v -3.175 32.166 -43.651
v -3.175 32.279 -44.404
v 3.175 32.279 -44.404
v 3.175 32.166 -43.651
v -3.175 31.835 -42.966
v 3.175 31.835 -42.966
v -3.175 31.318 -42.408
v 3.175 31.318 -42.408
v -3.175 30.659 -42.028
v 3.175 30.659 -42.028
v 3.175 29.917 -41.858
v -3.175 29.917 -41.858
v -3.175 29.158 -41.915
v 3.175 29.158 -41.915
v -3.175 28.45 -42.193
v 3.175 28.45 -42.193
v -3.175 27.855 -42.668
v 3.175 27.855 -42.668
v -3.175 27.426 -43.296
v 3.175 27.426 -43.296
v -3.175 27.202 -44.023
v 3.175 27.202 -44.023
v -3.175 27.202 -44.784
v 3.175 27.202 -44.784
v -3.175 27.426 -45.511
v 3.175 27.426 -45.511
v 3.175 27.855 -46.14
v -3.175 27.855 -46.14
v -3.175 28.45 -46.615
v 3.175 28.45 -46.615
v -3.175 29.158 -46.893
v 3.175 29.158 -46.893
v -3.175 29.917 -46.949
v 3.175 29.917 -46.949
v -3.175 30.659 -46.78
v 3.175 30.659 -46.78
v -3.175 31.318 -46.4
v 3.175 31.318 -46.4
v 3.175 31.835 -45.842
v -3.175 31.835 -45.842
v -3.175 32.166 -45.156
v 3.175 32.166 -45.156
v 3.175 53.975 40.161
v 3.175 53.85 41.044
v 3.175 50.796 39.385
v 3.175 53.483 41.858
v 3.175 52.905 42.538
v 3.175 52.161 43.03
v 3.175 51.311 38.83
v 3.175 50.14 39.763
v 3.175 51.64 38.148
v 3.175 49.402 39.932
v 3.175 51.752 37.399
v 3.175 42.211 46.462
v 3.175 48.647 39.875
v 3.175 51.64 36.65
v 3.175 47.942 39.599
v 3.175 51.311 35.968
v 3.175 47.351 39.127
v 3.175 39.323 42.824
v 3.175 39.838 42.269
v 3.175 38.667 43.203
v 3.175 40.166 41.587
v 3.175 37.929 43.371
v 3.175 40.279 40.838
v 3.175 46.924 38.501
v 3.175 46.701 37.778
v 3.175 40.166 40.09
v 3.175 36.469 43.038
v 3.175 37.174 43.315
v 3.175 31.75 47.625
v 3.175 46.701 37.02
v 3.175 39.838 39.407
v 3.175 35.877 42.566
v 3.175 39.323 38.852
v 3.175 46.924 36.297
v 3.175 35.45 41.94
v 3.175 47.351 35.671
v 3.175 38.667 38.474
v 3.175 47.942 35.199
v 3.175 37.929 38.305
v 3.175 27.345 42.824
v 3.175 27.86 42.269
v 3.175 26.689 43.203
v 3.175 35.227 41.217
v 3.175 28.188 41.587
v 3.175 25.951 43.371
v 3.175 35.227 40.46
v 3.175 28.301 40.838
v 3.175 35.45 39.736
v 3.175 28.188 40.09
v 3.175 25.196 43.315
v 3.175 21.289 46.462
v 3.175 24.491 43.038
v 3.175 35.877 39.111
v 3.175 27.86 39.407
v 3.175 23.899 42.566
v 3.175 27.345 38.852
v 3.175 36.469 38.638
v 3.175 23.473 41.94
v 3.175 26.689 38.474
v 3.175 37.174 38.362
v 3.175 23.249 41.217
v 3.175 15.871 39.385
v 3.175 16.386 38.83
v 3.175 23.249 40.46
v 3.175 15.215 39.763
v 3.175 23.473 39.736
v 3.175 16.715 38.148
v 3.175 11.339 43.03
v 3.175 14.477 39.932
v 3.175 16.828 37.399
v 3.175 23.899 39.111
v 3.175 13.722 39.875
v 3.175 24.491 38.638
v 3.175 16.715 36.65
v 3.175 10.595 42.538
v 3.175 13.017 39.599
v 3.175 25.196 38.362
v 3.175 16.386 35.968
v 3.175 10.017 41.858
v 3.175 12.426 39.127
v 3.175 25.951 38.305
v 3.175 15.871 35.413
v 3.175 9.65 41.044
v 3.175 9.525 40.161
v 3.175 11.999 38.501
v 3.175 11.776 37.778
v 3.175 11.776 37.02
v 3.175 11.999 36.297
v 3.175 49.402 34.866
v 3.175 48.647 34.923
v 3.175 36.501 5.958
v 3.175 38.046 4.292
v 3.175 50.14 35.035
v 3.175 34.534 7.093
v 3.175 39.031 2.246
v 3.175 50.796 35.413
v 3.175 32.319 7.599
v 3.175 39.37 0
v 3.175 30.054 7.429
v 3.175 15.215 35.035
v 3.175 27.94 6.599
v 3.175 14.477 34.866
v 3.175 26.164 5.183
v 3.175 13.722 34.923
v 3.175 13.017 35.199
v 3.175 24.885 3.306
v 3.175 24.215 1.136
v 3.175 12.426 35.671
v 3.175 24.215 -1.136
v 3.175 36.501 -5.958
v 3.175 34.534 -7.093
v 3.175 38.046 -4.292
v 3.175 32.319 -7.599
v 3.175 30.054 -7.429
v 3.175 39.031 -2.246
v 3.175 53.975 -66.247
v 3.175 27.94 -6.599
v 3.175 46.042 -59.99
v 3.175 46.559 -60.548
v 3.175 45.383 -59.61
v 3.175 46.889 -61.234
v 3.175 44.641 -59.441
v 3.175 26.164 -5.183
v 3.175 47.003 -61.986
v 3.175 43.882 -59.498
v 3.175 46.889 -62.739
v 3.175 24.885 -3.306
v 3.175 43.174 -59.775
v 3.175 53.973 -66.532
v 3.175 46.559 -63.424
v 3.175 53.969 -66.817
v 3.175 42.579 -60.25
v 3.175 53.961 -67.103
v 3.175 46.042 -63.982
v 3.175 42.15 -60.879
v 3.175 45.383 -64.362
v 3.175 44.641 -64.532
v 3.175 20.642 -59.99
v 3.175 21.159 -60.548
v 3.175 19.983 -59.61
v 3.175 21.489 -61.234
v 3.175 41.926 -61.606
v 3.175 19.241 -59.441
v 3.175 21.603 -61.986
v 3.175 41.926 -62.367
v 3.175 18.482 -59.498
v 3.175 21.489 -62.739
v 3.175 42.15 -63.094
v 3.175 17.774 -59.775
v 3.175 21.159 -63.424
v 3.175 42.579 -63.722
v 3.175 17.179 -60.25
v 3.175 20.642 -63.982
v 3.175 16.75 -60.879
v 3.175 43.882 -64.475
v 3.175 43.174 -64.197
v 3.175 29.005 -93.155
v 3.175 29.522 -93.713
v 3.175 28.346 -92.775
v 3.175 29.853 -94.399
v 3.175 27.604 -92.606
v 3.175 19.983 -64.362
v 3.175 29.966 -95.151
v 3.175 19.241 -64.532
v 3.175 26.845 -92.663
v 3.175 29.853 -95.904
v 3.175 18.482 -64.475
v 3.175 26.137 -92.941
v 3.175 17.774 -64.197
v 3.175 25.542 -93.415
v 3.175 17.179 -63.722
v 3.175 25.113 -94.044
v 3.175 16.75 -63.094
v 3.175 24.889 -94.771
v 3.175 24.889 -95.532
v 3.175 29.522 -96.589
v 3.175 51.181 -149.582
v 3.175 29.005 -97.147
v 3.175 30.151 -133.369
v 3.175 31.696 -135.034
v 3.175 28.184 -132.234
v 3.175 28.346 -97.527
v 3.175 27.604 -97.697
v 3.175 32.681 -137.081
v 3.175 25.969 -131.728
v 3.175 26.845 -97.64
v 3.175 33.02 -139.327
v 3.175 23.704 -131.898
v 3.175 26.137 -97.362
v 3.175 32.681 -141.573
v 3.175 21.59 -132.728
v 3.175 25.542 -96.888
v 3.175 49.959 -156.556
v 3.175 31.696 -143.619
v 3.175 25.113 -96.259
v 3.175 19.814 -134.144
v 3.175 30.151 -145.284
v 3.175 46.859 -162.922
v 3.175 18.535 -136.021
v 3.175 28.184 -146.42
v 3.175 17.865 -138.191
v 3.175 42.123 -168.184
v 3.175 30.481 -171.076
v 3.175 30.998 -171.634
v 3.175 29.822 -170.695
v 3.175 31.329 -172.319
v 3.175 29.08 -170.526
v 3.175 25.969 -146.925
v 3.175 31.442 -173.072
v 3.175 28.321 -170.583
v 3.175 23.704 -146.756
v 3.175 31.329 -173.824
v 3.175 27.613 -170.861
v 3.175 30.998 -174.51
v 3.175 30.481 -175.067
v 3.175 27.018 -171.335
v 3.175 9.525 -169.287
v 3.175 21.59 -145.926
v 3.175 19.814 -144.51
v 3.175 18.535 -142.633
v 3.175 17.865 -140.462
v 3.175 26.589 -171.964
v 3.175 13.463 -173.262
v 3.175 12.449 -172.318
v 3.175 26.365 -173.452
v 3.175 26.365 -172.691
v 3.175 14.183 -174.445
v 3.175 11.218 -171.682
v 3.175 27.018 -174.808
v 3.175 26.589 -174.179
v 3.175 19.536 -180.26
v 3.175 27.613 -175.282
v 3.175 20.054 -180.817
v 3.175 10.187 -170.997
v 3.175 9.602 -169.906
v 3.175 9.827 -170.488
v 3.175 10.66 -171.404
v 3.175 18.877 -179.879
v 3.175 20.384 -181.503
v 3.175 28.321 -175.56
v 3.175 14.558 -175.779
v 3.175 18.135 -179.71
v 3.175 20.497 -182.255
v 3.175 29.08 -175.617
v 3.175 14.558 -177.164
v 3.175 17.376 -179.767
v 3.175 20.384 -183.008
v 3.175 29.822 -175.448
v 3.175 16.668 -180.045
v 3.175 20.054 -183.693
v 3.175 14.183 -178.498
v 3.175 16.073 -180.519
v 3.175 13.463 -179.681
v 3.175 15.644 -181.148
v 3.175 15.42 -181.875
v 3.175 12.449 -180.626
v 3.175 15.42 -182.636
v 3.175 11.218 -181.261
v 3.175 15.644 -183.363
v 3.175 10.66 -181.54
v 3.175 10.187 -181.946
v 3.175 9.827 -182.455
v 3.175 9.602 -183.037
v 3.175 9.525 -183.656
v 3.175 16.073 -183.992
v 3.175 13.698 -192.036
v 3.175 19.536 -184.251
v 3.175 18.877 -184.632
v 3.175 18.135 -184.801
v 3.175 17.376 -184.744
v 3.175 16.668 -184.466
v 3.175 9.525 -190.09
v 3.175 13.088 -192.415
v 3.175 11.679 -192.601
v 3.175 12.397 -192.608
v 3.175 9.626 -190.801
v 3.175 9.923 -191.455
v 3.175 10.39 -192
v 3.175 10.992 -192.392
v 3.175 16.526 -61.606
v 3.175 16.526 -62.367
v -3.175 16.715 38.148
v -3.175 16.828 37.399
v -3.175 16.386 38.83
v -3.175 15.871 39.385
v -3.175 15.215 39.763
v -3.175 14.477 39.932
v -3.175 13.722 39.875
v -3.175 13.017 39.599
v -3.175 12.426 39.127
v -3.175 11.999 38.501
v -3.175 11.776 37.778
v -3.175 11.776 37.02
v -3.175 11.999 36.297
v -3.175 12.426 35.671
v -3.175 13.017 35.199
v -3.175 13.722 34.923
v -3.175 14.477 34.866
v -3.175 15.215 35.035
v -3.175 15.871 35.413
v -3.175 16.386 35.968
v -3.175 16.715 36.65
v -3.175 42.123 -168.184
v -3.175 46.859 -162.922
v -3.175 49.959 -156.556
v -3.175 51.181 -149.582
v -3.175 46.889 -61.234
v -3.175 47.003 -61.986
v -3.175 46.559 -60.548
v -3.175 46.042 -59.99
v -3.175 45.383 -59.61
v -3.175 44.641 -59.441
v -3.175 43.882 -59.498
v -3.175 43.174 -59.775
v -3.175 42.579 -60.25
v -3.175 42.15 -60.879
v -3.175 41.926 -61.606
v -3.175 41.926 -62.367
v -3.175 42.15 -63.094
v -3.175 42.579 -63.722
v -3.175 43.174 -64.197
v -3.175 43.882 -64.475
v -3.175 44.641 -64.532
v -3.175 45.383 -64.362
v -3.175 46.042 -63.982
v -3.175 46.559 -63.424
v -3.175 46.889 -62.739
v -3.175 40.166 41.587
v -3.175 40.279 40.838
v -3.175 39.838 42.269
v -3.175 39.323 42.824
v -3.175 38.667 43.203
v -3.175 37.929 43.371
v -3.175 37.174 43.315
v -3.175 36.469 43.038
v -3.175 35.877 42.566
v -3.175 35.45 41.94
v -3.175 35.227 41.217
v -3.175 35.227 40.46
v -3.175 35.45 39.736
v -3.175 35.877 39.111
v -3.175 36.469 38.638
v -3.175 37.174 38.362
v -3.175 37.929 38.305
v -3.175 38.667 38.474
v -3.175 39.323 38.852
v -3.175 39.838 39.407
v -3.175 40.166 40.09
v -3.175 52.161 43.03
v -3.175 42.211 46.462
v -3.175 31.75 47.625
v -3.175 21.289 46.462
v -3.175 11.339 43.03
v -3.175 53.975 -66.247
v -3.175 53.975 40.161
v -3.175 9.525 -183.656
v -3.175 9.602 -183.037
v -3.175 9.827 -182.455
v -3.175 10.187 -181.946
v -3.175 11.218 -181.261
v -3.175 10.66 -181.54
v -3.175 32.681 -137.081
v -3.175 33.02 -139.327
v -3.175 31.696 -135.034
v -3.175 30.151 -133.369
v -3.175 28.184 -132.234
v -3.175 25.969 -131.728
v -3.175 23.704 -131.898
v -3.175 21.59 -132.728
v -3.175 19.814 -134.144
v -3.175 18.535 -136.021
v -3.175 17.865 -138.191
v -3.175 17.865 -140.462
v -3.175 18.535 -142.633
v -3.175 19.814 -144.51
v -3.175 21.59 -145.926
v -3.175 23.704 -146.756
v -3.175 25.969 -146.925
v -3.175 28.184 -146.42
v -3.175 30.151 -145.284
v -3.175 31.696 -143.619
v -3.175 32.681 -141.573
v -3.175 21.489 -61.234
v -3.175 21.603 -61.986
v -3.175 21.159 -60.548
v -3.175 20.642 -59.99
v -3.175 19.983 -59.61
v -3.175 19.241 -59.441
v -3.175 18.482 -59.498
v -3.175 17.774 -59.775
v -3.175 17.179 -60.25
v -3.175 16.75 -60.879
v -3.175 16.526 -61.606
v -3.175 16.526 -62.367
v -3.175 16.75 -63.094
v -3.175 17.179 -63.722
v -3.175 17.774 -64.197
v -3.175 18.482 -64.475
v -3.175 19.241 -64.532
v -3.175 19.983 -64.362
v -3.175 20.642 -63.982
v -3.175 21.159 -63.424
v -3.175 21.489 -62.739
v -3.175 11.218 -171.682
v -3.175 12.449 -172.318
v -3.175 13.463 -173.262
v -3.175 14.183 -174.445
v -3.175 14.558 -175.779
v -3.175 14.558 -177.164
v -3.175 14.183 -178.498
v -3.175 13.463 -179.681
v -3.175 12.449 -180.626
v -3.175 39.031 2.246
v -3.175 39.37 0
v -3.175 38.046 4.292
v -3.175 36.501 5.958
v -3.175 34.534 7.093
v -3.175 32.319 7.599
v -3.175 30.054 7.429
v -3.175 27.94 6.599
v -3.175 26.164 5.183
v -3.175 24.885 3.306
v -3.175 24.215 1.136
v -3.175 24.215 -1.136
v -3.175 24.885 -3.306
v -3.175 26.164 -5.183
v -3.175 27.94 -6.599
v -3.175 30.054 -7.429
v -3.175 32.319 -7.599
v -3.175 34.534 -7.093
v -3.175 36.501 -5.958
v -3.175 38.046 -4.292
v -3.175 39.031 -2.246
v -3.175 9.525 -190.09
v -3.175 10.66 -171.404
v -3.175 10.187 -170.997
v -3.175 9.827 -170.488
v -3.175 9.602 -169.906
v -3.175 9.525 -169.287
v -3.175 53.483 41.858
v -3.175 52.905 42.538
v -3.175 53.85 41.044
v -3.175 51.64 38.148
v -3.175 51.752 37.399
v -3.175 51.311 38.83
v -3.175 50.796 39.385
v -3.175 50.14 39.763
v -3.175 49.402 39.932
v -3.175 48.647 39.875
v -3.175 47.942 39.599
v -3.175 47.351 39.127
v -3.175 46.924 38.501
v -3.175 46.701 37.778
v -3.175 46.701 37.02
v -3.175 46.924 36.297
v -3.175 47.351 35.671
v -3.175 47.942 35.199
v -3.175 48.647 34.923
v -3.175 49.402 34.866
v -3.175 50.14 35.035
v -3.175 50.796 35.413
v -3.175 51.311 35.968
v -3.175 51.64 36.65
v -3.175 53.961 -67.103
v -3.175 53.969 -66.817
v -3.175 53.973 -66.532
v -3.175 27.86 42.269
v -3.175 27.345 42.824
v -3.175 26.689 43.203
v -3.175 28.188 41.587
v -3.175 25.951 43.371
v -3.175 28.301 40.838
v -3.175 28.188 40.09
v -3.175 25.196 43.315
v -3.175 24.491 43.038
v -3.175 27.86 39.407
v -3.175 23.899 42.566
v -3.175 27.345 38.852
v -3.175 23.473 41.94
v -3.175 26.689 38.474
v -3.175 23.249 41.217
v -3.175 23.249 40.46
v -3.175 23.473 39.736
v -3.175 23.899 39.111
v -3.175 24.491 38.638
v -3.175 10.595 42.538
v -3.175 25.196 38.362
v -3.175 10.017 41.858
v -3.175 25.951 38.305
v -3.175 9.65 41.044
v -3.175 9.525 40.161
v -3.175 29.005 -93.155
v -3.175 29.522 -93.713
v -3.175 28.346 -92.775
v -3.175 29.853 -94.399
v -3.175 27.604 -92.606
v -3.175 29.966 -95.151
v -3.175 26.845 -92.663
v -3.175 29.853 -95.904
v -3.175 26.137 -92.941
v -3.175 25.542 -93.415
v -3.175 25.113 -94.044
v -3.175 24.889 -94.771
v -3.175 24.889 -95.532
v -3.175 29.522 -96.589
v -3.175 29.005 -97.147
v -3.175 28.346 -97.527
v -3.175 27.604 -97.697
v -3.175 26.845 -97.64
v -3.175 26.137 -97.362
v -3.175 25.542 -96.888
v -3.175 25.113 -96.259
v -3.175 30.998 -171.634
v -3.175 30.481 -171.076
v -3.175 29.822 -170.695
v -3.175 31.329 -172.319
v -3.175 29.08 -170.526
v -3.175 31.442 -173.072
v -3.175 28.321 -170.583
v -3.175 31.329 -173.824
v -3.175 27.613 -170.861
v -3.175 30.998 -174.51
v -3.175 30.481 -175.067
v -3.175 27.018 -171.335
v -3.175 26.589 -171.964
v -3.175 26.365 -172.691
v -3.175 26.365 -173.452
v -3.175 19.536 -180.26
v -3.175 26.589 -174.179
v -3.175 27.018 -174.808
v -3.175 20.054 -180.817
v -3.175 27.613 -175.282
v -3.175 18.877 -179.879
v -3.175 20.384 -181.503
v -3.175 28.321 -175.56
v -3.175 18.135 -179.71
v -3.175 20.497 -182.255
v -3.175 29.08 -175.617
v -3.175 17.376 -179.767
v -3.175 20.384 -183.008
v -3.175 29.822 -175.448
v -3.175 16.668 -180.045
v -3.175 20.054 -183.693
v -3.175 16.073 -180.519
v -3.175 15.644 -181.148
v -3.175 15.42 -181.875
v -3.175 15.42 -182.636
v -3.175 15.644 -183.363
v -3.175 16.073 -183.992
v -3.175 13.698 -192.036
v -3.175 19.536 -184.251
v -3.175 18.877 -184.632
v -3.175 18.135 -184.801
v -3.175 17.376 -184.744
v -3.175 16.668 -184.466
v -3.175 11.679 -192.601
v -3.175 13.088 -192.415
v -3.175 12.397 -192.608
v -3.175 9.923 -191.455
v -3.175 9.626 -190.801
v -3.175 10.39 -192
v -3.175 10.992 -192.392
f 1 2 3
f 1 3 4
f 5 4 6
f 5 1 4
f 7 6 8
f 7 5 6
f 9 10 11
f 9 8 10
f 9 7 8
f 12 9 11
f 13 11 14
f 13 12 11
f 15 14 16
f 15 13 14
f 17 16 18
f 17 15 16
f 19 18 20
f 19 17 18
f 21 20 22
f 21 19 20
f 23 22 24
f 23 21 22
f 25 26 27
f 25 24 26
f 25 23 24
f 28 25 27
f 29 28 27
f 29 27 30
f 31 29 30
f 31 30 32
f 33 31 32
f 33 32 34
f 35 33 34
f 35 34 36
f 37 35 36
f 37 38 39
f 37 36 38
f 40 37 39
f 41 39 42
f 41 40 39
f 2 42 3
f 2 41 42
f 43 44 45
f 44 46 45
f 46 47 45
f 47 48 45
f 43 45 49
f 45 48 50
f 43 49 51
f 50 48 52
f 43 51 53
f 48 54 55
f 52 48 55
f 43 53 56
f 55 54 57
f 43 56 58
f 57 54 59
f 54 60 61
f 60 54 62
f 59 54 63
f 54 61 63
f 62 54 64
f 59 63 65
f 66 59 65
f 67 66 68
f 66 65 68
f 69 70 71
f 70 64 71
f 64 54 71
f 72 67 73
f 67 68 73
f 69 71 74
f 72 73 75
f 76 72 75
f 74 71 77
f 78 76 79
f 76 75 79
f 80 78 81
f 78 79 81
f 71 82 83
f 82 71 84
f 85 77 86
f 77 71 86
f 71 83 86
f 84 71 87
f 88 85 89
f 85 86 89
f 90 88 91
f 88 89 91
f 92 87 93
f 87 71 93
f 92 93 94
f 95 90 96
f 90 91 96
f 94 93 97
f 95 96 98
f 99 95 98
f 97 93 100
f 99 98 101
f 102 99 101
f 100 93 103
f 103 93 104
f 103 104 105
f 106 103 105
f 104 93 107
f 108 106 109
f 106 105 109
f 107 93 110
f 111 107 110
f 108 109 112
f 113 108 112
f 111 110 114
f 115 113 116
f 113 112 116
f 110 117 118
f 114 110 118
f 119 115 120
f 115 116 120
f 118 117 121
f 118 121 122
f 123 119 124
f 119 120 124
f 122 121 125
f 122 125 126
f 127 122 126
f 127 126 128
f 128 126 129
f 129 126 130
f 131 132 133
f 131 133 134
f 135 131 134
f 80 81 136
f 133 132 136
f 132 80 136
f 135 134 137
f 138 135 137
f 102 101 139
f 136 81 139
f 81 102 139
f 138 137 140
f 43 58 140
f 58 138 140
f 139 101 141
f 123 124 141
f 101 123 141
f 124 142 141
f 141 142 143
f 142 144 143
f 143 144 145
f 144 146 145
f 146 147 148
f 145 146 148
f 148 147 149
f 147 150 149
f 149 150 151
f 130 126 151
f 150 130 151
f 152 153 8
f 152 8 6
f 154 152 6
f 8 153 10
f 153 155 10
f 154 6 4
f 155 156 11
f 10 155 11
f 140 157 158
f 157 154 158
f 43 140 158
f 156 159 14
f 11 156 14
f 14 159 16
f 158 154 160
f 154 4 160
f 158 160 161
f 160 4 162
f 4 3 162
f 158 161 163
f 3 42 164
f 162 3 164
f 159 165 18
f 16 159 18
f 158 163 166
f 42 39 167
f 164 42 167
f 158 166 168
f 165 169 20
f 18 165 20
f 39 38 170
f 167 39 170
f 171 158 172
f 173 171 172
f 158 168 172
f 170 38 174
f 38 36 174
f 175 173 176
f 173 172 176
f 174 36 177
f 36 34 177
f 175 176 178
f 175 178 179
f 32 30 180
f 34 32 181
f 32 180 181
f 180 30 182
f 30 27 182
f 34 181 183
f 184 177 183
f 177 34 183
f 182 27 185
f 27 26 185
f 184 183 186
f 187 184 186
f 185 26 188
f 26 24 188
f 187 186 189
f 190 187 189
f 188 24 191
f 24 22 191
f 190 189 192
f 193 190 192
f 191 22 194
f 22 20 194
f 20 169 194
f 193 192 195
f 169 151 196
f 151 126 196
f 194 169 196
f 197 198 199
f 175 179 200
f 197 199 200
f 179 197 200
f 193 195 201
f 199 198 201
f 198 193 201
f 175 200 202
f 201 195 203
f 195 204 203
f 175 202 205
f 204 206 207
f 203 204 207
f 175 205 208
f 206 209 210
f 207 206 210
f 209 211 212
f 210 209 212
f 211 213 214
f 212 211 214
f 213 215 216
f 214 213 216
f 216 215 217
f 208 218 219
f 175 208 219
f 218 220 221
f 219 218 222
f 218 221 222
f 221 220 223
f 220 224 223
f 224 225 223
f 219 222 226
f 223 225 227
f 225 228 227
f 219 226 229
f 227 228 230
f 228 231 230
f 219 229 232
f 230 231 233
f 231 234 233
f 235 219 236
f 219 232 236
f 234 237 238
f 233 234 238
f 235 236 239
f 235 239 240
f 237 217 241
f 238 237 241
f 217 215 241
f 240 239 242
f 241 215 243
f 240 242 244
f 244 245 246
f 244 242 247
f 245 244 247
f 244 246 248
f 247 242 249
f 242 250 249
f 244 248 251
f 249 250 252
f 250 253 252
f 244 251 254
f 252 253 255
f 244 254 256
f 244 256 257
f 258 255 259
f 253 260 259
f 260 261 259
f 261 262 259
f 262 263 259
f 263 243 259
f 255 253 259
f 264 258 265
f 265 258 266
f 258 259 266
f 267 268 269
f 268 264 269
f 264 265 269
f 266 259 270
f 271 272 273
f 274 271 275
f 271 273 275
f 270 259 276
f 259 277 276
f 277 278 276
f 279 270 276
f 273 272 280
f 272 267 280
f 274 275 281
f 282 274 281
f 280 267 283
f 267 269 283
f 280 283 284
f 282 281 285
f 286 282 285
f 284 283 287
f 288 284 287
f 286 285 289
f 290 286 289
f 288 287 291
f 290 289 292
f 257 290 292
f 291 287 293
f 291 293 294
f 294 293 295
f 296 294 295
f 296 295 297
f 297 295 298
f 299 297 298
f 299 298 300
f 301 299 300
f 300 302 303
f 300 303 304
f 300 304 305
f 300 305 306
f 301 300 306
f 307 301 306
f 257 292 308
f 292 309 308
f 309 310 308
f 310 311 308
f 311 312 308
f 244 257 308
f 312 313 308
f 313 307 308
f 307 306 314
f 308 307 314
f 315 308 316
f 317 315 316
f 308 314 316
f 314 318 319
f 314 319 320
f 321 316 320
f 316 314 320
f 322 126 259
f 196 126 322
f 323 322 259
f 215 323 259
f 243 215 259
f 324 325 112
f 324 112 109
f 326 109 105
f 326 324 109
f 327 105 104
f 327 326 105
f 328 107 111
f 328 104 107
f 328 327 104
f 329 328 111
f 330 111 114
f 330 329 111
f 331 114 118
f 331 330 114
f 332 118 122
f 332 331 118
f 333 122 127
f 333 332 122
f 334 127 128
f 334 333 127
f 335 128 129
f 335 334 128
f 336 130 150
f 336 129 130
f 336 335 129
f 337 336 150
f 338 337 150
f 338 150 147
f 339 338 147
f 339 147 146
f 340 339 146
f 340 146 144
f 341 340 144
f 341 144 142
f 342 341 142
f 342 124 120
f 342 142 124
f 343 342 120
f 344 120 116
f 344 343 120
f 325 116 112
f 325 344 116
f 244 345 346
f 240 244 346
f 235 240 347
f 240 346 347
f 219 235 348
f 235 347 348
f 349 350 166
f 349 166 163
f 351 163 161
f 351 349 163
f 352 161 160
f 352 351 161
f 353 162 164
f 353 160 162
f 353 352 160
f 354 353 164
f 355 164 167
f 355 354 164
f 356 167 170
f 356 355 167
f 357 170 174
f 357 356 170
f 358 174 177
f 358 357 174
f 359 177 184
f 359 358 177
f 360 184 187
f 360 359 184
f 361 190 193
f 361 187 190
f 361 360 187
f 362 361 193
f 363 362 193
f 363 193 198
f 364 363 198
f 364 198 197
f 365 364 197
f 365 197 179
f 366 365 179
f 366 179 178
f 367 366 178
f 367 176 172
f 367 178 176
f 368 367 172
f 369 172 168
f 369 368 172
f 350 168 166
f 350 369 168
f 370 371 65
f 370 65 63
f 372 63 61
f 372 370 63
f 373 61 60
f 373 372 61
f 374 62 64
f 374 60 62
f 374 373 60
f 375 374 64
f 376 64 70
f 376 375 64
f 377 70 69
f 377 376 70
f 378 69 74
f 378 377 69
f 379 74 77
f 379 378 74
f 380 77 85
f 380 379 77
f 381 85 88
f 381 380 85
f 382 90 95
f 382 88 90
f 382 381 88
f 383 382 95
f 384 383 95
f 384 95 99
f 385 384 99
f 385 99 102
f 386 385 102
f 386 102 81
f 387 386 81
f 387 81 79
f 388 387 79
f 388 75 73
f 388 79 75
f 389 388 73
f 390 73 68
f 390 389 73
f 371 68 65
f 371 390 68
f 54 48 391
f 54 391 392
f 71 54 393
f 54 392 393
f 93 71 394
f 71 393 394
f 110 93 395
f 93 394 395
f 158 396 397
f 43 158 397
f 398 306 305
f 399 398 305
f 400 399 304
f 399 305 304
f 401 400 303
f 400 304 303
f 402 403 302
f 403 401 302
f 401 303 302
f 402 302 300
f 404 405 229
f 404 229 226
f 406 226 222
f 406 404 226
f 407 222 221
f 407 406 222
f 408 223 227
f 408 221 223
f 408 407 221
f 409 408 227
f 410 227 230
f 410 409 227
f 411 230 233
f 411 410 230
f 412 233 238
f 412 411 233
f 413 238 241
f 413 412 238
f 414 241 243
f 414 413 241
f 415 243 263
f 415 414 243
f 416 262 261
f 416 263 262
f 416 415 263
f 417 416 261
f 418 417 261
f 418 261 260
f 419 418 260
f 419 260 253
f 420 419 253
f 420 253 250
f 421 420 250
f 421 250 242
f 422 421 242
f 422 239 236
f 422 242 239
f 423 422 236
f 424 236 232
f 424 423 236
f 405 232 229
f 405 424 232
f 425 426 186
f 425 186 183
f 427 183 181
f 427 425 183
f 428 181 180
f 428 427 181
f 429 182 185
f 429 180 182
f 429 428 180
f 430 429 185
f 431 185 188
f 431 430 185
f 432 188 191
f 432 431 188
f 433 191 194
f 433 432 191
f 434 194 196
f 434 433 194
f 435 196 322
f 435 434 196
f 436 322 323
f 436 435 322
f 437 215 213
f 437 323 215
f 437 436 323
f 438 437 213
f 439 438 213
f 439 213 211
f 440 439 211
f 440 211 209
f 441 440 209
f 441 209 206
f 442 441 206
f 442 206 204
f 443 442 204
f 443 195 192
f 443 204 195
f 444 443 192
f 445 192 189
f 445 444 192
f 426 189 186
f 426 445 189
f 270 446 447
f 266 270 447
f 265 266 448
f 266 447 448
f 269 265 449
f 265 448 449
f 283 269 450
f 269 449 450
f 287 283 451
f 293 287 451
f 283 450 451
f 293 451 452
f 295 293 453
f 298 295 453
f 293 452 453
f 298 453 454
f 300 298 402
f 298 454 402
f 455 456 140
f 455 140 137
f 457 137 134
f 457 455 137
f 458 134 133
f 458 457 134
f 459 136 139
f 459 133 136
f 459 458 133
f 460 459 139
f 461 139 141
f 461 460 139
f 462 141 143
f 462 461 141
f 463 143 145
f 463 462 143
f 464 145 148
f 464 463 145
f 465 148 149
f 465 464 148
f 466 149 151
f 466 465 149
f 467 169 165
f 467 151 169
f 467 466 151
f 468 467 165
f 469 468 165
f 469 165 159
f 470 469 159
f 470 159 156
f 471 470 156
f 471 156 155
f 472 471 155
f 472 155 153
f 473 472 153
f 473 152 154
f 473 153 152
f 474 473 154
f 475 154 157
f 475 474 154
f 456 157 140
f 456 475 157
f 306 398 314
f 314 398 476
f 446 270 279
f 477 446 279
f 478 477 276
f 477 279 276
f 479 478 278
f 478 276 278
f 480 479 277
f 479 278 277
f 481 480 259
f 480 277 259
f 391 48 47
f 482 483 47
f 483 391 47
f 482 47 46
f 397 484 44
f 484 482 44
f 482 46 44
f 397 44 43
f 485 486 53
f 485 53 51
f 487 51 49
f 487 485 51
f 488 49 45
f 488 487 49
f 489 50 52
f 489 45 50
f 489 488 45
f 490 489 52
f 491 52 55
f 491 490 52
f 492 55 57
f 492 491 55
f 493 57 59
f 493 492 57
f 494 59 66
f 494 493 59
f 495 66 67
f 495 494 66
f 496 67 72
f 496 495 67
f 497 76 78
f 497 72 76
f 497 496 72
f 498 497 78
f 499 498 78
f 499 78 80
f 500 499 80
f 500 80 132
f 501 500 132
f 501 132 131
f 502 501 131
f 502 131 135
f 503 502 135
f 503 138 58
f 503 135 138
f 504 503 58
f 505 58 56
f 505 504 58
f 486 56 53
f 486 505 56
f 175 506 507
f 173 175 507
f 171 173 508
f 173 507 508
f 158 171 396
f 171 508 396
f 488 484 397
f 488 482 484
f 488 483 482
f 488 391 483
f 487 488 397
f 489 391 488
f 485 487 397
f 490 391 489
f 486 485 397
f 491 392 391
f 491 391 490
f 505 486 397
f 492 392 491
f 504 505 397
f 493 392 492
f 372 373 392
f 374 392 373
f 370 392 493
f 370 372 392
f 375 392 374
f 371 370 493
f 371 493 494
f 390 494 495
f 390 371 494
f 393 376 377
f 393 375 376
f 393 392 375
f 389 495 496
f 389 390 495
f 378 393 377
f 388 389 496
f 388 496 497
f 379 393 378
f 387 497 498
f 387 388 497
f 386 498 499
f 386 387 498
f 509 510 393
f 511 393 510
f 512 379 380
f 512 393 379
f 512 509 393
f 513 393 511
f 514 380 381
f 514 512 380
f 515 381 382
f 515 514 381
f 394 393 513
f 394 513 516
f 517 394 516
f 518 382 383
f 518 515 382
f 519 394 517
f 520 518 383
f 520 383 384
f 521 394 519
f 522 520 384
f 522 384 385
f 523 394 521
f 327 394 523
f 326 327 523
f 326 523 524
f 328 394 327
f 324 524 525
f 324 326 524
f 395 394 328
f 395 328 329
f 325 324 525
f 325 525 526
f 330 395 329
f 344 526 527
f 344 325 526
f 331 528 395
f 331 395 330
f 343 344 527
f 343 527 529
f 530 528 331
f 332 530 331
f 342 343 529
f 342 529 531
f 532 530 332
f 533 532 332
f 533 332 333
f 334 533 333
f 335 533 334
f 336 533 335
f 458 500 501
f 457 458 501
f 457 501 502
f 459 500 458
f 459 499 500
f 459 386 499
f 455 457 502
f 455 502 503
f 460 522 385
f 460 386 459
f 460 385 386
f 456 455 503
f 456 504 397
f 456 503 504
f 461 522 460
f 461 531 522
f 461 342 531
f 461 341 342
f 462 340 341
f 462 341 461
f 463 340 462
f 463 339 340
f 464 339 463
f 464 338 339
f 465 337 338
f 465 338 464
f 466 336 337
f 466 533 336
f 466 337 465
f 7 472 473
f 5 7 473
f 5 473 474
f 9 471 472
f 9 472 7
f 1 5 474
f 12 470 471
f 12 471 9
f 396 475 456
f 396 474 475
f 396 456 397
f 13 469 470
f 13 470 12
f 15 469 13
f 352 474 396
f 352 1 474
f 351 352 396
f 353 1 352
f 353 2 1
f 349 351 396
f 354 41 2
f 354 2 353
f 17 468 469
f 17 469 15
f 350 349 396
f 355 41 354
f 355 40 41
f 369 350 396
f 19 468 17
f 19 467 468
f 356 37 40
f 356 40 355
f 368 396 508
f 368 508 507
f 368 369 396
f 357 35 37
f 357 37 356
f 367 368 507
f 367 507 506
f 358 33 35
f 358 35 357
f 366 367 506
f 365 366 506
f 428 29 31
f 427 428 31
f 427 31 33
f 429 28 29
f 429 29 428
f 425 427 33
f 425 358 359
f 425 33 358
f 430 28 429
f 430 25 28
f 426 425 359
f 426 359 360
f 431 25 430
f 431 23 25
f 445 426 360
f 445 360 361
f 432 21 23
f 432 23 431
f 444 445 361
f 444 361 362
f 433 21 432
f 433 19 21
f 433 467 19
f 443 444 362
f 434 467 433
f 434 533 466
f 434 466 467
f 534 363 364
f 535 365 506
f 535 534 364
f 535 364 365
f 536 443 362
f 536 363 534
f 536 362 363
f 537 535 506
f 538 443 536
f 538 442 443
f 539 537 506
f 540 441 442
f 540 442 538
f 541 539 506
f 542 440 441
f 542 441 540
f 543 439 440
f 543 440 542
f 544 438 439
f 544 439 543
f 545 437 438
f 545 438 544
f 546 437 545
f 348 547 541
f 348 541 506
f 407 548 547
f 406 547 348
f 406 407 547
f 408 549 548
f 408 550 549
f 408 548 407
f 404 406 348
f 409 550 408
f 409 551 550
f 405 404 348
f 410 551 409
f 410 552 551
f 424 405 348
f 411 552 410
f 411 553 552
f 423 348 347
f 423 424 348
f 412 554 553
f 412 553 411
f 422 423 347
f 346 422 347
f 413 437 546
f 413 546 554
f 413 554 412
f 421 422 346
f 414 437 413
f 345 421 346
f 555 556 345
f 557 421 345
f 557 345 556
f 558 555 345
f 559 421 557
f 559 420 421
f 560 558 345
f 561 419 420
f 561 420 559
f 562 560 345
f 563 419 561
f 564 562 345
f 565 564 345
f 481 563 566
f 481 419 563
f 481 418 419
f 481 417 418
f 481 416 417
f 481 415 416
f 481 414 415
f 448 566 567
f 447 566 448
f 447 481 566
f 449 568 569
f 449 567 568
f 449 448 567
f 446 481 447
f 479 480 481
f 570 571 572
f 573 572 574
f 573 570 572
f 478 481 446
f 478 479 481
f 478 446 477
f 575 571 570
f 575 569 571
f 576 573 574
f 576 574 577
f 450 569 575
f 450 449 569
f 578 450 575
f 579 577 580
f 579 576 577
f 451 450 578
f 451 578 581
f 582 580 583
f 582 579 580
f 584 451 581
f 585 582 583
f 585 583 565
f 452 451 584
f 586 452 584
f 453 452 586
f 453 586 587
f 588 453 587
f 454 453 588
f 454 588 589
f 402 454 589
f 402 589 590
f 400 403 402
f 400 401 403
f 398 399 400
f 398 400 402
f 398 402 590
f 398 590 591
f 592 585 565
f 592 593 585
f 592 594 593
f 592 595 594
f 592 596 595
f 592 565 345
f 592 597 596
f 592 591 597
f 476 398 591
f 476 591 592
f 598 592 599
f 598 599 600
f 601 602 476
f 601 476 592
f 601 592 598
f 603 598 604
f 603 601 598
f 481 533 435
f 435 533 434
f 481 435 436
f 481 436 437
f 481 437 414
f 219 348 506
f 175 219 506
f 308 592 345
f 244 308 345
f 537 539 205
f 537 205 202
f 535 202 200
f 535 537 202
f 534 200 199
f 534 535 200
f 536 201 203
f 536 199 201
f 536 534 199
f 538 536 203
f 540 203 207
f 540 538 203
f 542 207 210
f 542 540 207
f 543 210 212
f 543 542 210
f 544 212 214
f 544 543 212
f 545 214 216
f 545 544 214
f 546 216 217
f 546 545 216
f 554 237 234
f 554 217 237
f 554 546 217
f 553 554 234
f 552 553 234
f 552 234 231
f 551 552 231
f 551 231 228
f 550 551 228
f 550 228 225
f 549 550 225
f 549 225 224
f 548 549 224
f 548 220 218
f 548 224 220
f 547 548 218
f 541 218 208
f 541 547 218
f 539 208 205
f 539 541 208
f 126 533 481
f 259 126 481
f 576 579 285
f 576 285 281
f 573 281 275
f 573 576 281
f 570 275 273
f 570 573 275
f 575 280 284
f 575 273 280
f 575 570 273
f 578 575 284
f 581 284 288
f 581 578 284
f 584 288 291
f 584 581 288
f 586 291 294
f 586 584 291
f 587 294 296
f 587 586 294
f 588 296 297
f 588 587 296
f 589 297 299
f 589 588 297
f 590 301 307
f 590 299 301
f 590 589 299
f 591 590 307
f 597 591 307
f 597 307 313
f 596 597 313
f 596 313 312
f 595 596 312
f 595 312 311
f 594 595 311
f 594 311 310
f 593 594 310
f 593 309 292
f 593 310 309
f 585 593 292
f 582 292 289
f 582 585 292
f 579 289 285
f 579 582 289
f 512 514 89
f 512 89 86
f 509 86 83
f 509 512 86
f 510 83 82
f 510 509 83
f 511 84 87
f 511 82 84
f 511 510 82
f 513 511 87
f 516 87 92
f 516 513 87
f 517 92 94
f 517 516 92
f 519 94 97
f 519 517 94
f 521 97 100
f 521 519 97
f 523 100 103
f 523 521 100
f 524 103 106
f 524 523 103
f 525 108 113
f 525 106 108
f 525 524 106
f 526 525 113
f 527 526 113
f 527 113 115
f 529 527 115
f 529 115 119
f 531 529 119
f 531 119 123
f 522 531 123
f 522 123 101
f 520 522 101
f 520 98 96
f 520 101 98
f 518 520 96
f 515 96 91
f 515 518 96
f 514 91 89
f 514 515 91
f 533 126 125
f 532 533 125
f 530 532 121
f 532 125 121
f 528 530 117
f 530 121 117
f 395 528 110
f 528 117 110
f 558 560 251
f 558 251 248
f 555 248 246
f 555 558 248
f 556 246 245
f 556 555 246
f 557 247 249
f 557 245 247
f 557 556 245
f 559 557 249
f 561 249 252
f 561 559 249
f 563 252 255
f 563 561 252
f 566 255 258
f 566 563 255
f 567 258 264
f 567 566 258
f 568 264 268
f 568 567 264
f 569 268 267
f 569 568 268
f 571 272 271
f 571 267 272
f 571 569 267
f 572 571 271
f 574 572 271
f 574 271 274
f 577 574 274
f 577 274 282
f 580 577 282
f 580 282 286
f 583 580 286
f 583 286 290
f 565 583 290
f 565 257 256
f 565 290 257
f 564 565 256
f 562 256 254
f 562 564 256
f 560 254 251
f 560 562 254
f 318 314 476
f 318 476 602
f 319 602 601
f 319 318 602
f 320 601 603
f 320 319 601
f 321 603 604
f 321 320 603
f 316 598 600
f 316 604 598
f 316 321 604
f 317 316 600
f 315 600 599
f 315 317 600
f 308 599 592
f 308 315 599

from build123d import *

# Parameters (mm, degrees)
STOCK_HAMMERSAW_START                   = -149.225
STOCK_HAMMERSAW_MULTIBODY_1_OUTLINE_R   = 2.5527
STOCK_HAMMERSAW_MULTIBODY_1_OUTLINE_R_2 = 7.62
STOCK_HAMMERSAW_MULTIBODY_1_OUTLINE_R_3 = 2.54
STOCK_HAMMERSAW_MULTIBODY_1_DEPTH       = 9.525
FILLET1_R                               = 2.54
FILLET2_R                               = 3.175
FILLET3_R                               = 25.4
FILLET4_R                               = 2.54
CUT_EXTRUDE1_DEPTH                      = 201.10578904
CUT_EXTRUDE1_DEPTH_BACK                 = 201.10578904
SKETCH1_W                               = 1.5875
SKETCH1_H                               = 240.255072357


with BuildPart() as part:
    # Stock-HammerSaw Multibody-1: read off the stored shape, not the designer's step
    # Stock-HammerSaw Multibody-1 outline → Stock-HammerSaw Multibody-1 (new body)
    with BuildSketch(Plane.YZ.offset(STOCK_HAMMERSAW_START)):
        with BuildLine():
            Line((9.525, 42.121134838), (9.525, -171.391646474))
            ThreePointArc((9.525, -171.391646474), (14.605, -176.471646474), (9.525, -181.551646474))
            Line((9.525, -181.551646474), (9.525, -195.537119935))
            Line((9.525, -195.537119935), (50.8, -160.903282658))
            Line((50.8, -160.903282658), (53.975, -66.675))
            Line((53.975, -66.675), (53.975, 42.121134838))
            ThreePointArc((53.975, 42.121134838), (31.75, 47.625), (9.525, 42.121134838))
        make_face()
        with Locations((17.944382949, -182.255416592)):
            Circle(STOCK_HAMMERSAW_MULTIBODY_1_OUTLINE_R, mode=Mode.SUBTRACT)
        with Locations((28.88924293, -173.071588618)):
            Circle(STOCK_HAMMERSAW_MULTIBODY_1_OUTLINE_R, mode=Mode.SUBTRACT)
        with Locations((25.4, -139.326770285)):
            Circle(STOCK_HAMMERSAW_MULTIBODY_1_OUTLINE_R_2, mode=Mode.SUBTRACT)
        with Locations((27.413358223, -95.151227202)):
            Circle(STOCK_HAMMERSAW_MULTIBODY_1_OUTLINE_R, mode=Mode.SUBTRACT)
        with Locations((19.05, -61.986201926)):
            Circle(STOCK_HAMMERSAW_MULTIBODY_1_OUTLINE_R, mode=Mode.SUBTRACT)
        with Locations((29.726233837, -44.403906028)):
            Circle(STOCK_HAMMERSAW_MULTIBODY_1_OUTLINE_R, mode=Mode.SUBTRACT)
        with Locations((14.2875, 37.399020291)):
            Circle(STOCK_HAMMERSAW_MULTIBODY_1_OUTLINE_R_3, mode=Mode.SUBTRACT)
        with Locations((25.761047521, 40.838193804)):
            Circle(STOCK_HAMMERSAW_MULTIBODY_1_OUTLINE_R_3, mode=Mode.SUBTRACT)
        with Locations((44.45, -61.986201926)):
            Circle(STOCK_HAMMERSAW_MULTIBODY_1_OUTLINE_R, mode=Mode.SUBTRACT)
        with Locations((31.75, 0)):
            Circle(STOCK_HAMMERSAW_MULTIBODY_1_OUTLINE_R_2, mode=Mode.SUBTRACT)
        with Locations((37.738952479, 40.838193804)):
            Circle(STOCK_HAMMERSAW_MULTIBODY_1_OUTLINE_R_3, mode=Mode.SUBTRACT)
        with Locations((49.2125, 37.399020291)):
            Circle(STOCK_HAMMERSAW_MULTIBODY_1_OUTLINE_R_3, mode=Mode.SUBTRACT)
    extrude(amount=STOCK_HAMMERSAW_MULTIBODY_1_DEPTH)


with BuildPart() as part_1:
    # Body-Move/Copy2: read off the stored shape, not the designer's step
    # Body-Move/Copy2: moved
    add(part.part.moved(Location((144.4625, 0, 0))))

    # Fillet1
    fillet1_edges = [part_1.edges().sort_by_distance(p)[0] for p in [
        (0, 9.525, -195.537119935),
    ]]
    fillet(fillet1_edges, radius=FILLET1_R)

    # Fillet2
    fillet2_edges = [part_1.edges().sort_by_distance(p)[0] for p in [
        (0, 53.975, 42.121134838),
        (0, 9.525, 42.121134838),
    ]]
    fillet(fillet2_edges, radius=FILLET2_R)

    # Fillet3
    # the kernel refuses this fillet: 25.4 mm, written as the material it takes off along each edge
    with BuildSketch(Plane(origin=(-33.08112114, 50.8, -160.903282658), x_dir=(0, -0.7660444431175363, -0.6427876096882575), z_dir=(1, 0, 0))) as fillet3_piece_1:
        with BuildLine():
            CenterArc((FILLET3_R * 0.445962537632, -FILLET3_R), FILLET3_R, 90, 48.070162195)
            Line((-FILLET3_R * 0.2980011219, -FILLET3_R * 0.33177992151), (0, 0))
            Line((0, 0), (FILLET3_R * 0.445962537632, 0))
        make_face()
    extrude(amount=66.162242279, mode=Mode.SUBTRACT)
    with BuildSketch(Plane(origin=(-5.832005366, 53.975, -66.675), x_dir=(0, 0, 1), z_dir=(1, 0, 0))) as fillet3_piece_2:
        with BuildLine():
            CenterArc((FILLET3_R * 0.0168426041932, FILLET3_R), FILLET3_R, 268.070162195, 1.929837805)
            Line((-FILLET3_R * 0.0168330513083, FILLET3_R * 0.000567185736557), (0, 0))
            Line((0, 0), (FILLET3_R * 0.0168426041932, 0))
        make_face()
    extrude(amount=11.664010733, mode=Mode.SUBTRACT)

    # Fillet4
    fillet4_edges = [part_1.edges().sort_by_distance(p)[0] for p in [
        (0, 9.525, -181.551646474),
        (0, 9.525, -171.391646474),
    ]]
    fillet(fillet4_edges, radius=FILLET4_R)

    # Sketch1 → Cut-Extrude1 (cut, two sides: drawn at the far end of the back side and taken through both)
    with BuildSketch(Plane(origin=(0, 0, 0), x_dir=(1, 0, 0), z_dir=(0, 1, 0)).offset(-CUT_EXTRUDE1_DEPTH_BACK)):
        with Locations((-3.96875, 72.502536179)):
            Rectangle(SKETCH1_W, SKETCH1_H)
        with Locations((3.96875, 72.502536179)):
            Rectangle(SKETCH1_W, SKETCH1_H)
    extrude(amount=CUT_EXTRUDE1_DEPTH + CUT_EXTRUDE1_DEPTH_BACK, mode=Mode.SUBTRACT)


solid = part_1.part
